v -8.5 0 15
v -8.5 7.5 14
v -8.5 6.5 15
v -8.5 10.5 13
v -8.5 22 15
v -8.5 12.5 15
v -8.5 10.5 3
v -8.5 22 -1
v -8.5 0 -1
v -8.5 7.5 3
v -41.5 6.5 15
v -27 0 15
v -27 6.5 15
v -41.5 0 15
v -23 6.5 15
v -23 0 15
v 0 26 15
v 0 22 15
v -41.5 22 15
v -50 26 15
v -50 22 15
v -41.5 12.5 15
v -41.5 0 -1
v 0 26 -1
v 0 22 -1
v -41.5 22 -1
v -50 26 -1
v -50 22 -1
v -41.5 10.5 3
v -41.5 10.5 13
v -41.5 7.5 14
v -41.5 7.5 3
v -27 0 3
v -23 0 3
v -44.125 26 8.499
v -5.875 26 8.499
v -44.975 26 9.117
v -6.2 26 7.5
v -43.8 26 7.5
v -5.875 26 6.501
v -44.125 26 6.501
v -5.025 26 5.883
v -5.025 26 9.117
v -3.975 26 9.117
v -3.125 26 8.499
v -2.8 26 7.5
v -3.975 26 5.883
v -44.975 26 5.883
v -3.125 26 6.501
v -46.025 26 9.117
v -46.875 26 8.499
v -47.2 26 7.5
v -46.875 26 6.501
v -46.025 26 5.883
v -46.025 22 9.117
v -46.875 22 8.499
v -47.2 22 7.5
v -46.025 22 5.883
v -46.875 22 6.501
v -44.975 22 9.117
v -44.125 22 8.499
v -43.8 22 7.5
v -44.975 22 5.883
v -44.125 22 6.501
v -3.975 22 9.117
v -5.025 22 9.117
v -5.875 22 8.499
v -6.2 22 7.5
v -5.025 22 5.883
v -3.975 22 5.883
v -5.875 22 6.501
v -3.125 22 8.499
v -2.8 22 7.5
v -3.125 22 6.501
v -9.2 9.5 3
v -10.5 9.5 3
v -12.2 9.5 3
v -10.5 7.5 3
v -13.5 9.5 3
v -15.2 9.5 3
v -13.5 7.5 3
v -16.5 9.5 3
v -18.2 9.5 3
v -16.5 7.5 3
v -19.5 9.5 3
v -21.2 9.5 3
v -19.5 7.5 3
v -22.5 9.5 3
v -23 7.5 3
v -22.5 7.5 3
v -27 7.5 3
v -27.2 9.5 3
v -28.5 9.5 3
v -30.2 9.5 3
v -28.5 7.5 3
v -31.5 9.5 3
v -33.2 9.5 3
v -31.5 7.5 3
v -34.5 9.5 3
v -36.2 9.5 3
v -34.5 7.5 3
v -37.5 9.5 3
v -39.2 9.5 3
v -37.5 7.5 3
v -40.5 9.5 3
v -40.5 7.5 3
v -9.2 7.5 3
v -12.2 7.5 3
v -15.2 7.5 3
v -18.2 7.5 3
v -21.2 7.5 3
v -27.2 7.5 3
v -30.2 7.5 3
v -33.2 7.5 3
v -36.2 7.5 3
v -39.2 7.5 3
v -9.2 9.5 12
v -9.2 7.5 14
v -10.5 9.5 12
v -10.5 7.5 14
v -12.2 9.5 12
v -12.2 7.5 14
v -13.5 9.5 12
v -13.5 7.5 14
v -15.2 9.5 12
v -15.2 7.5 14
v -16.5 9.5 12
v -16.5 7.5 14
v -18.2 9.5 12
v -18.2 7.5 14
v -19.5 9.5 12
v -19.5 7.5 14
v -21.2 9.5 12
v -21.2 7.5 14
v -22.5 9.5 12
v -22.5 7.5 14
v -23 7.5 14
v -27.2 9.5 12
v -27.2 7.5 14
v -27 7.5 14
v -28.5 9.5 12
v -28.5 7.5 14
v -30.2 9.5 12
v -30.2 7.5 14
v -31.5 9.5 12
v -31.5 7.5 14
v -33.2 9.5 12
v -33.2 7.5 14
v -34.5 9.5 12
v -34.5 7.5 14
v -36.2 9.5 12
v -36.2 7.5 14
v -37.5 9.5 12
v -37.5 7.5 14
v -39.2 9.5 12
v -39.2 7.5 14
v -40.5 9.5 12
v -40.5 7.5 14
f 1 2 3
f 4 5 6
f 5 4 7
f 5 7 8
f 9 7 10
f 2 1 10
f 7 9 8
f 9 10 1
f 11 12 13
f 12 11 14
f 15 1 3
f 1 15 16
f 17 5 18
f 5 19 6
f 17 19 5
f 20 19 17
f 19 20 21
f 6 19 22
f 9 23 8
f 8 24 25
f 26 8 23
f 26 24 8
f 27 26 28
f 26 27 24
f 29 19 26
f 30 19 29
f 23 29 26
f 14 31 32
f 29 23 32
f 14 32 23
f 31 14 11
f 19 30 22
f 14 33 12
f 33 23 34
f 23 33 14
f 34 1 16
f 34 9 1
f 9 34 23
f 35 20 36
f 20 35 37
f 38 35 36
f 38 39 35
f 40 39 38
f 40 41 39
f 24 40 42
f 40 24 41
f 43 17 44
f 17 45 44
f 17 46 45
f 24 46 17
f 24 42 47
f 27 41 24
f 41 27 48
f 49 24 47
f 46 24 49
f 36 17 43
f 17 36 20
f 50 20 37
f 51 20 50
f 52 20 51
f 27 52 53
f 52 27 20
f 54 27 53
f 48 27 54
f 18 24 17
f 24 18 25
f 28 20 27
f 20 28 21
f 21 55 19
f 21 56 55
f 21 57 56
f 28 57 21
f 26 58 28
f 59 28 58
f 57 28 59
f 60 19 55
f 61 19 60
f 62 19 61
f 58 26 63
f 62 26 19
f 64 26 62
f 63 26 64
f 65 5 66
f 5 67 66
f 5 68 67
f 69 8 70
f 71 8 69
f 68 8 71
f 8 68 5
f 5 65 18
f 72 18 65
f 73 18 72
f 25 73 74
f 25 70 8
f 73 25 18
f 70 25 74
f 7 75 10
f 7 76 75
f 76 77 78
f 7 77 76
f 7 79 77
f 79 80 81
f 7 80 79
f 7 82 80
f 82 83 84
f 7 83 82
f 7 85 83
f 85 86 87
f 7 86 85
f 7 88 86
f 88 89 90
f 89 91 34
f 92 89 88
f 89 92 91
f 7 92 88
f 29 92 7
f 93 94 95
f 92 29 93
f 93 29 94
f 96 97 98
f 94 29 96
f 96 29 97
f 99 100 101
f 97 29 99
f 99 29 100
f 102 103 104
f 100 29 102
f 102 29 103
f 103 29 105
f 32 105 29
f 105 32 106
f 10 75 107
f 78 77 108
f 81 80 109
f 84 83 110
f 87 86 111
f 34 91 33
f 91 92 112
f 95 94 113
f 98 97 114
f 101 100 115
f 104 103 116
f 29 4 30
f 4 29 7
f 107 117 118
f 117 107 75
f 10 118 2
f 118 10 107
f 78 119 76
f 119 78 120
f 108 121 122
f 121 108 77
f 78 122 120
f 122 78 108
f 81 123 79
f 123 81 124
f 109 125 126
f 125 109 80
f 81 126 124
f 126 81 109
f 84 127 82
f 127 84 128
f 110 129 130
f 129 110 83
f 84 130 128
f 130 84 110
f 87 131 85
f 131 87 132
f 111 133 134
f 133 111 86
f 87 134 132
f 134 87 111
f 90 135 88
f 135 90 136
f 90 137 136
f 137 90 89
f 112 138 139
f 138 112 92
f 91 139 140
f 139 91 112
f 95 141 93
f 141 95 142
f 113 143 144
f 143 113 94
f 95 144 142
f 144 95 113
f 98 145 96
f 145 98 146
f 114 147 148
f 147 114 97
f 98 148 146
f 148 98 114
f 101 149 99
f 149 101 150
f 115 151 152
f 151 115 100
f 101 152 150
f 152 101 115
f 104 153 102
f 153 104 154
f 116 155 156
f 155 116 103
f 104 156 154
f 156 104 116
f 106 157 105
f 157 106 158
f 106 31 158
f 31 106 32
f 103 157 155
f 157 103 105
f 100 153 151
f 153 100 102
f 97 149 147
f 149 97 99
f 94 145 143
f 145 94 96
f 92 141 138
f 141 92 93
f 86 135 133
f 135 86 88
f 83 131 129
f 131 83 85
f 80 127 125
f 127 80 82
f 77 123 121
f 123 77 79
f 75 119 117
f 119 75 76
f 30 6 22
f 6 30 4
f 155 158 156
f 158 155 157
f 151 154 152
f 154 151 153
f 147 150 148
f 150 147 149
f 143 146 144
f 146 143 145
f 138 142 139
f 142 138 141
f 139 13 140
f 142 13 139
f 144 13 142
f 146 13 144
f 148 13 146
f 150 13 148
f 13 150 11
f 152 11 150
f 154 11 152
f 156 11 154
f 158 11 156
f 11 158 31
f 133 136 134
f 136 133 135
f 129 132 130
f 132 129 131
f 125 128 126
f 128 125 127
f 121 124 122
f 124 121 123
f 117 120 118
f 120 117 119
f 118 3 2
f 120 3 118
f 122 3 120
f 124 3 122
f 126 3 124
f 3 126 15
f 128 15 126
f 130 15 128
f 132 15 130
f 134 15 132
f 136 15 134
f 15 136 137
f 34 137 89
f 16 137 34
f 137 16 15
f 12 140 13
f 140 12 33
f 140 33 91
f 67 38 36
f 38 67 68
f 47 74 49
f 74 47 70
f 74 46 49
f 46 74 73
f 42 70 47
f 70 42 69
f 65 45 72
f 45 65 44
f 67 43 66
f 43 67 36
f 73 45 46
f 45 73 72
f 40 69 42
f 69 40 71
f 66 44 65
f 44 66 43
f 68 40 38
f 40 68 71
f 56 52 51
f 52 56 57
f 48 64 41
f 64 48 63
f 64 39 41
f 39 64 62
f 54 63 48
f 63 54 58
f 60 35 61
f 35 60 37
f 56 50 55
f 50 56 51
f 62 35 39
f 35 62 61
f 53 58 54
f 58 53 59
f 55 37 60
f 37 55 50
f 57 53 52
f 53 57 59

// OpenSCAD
// file: ../inc/functions.scad
// PRUSA iteration3
// Functions used in many files
// GNU GPL v3
// Josef Průša <josefprusa@me.com>
// Václav 'ax' Hůla <axtheb@gmail.com>
// Vlnofka <>
// http://www.reprap.org/wiki/Prusa_Mendel
// http://github.com/prusajr/PrusaMendel


module nut(d,h,horizontal=true){
    cornerdiameter =  (d / 2) / cos (180 / 6);
    cylinder(h = h, r = cornerdiameter, $fn = 6);
    if(horizontal){
        for(i = [1:6]){
            rotate([0,0,60*i]) translate([-cornerdiameter-0.2,0,0]) rotate([0,0,-45]) cube([2,2,h]);
        }
    }
}

module fillet(radius, height=100, $fn=0) {
    //this creates acutal fillet
    translate([-radius, -radius, -height / 2 - 0.02]) difference() {
        cube([radius * 2, radius * 2, height + 0.04]);
        if ($fn == 0 && (radius == 2 || radius == 3 || radius == 4)) {
            cylinder(r=radius, h=height + 0.04, $fn=4 * radius);
        } else {
            cylinder(r=radius, h=height + 0.04, $fn=$fn);
        }

    }
}

module cube_fillet(size, radius=-1, vertical=[3,3,3,3], top=[0,0,0,0], bottom=[0,0,0,0], center=false, $fn=0){
    //
    if (use_fillets == 1) {
        if (center) {
            cube_fillet_inside(size, radius, vertical, top, bottom, $fn);
        } else {
            translate([size[0]/2, size[1]/2, size[2]/2])
                cube_fillet_inside(size, radius, vertical, top, bottom, $fn);
        }
    } else {
        if (use_fillets == 2) {
            if (center) {
                cube_fillet_inside(size, radius, vertical, top, bottom, 4);
            } else {
                translate([size[0]/2, size[1]/2, size[2]/2])
                    cube_fillet_inside(size, radius, vertical, top, bottom, 4);
            }

        } else {
            cube(size, center);
        }
    }

}

module cube_negative_fillet(size, radius=-1, vertical=[3,3,3,3], top=[0,0,0,0], bottom=[0,0,0,0], $fn=0){

    j=[1,0,1,0];

    for (i=[0:3]) {
        if (radius > -1) {
            rotate([0, 0, 90*i]) translate([size[1-j[i]]/2, size[j[i]]/2, 0]) fillet(radius, size[2], $fn=$fn);
        } else {
            rotate([0, 0, 90*i]) translate([size[1-j[i]]/2, size[j[i]]/2, 0]) fillet(vertical[i], size[2], $fn=$fn);
        }
        rotate([90*i, -90, 0]) translate([size[2]/2, size[j[i]]/2, 0 ]) fillet(top[i], size[1-j[i]], $fn=$fn);
        rotate([90*(4-i), 90, 0]) translate([size[2]/2, size[j[i]]/2, 0]) fillet(bottom[i], size[1-j[i]], $fn=$fn);

    }
}

module cube_fillet_inside(size, radius=-1, vertical=[3,3,3,3], top=[0,0,0,0], bottom=[0,0,0,0], $fn=0){
    //makes CENTERED cube with round corners
    // if you give it radius, it will fillet vertical corners.
    //othervise use vertical, top, bottom arrays
    //when viewed from top, it starts in upper right corner (+x,+y quadrant) , goes counterclockwise
    //top/bottom fillet starts in direction of Y axis and goes CCW too


    if (radius == 0) {
        cube(size, center=true);
    } else {
        difference() {
            cube(size, center=true);
            cube_negative_fillet(size, radius, vertical, top, bottom, $fn);
        }
    }
}


module nema17(places=[1,1,1,1], size=15.5, h=10, holes=false, shadow=false, $fn=24){
    for (i=[0:3]) {
        if (places[i] == 1) {
            rotate([0, 0, 90*i]) translate([size, size, 0]) {
                if (holes) {
                    rotate([0, 0, -90*i])  translate([0,0,-10]) screw(r=1.7, slant=false, head_drop=13, $fn=$fn, h=h+12);
                } else {
                    rotate([0, 0, -90*i]) cylinder(h=h, r=5.5, $fn=$fn);
                }
            }
        }
    }
    if (shadow != false) {
        %translate ([0, 0, shadow+21+3]) cube([42,42,42], center = true);
    //flange
        %translate ([0, 0, shadow+21+3-21-1]) cylinder(r=11,h=2, center = true, $fn=20);
    //shaft
        %translate ([0, 0, shadow+21+3-21-7]) cylinder(r=2.5,h=14, center = true);
    }
}

module screw(h=20, r=2, r_head=3.5, head_drop=0, slant=i_am_box, poly=false, $fn=0){
    //makes screw with head
    //for substraction as screw hole
    if (poly) {
        cylinder_poly(h=h, r=r, $fn=$fn);
    } else {
        cylinder(h=h, r=r, $fn=$fn);
    }
    if (slant) {
        translate([0, 0, head_drop-0.01]) cylinder(h=r_head, r2=0, r1=r_head, $fn=$fn);
    }

    if (head_drop > 0) {
        translate([0, 0, -0.01]) cylinder(h=head_drop+0.01, r=r_head, $fn=$fn);
    }
}

module plate_screw(long=0) {
    if (i_am_box == 0) {
        translate([0, 0, -long]) screw(head_drop=14 + long, h=30 + long, r_head=3.6, r=1.7, $fn=24, slant=false);
    } else {
        translate([0, 0, -2 - long]) screw(head_drop=14 + long, h=30 + long, r_head=4.5, r=2, $fn=24, slant=true);
    }
}

//radius of the idler assembly (to surface that touches belt, ignoring guide walls)
function idler_assy_r_inner(idler_bearing) = (idler_bearing[0] / 2) + (6 * single_wall_width + 0.2) * idler_bearing[3];
//outer radius of the idler assembly (to smooth side of belt) 
function idler_assy_r_outer(idler_bearing) = idler_assy_r_inner(idler_bearing) + belt_thickness + 1;


module idler_assy(idler_bearing = [22, 7, 8, 1]) {

    //bearing axle
    translate([0,0,-1]) cylinder(h = 120, r=(idler_bearing[2] + 1) / 2, $fn=small_hole_segments, center=true);
    //bearing shadow
    %cylinder(h = idler_bearing[1], r=idler_bearing[0]/2, center=true);
    //belt shadow
    %cylinder(h = belt_width, r=idler_assy_r_outer(idler_bearing), center=true);

    cylinder(h = idler_width + 1, r=idler_assy_r_outer(idler_bearing) + 0.5, center=true);
}

module belt(len, side = 0){
    //belt. To be substracted from model
    //len is in +Z, smooth side in +X, Y centered
    translate([-0.5, 0, 0]) maketeeth(len);
    translate([0, -4.5, -0.01]) cube([belt_thickness, 9, len + 0.02]);
    if (side != 0) {
    translate([0, -4.5 + side, -0.01]) cube_fillet([belt_thickness, 9, len + 0.02], vertical = [3, 0, 0, 0]);
    }
}


module maketeeth(len){
    //Belt teeth. 
    for (i = [0 : len / belt_tooth_distance]) {
        translate([0, 0, i * belt_tooth_distance]) cube([2, 9, belt_tooth_distance * belt_tooth_ratio], center = true);
    }
}
// file: ../inc/conf_bushing.scad
// PRUSA iteration3
// Bushing and bering dimensions
// GNU GPL v3
// Václav 'ax' Hůla <axtheb@gmail.com>
// http://www.reprap.org/wiki/Prusa_Mendel
// http://github.com/prusajr/PrusaMendel
//

// each config is in form[r_rod, r, h, type, name] where:
//     r_rod  is smooth rod radius [0]
//     r is outer bushing radius needed for tight fit or bearing radius with loose fit [1]
//     h is barrel length [2]
//     type is 0 for linear bearings, 1 is for bushings which needs to be enclosed fully. [3]
//       type 1 may have flange, but type 0 not
//     name is human readable name [4]

//bushings
conf_b_bushing8 = [4, 5.1, 10, 1, "Tube shaped bushing like igus J(V)FM 0810-10"];
conf_b_bushing10 = [5, 6.1, 10, 1, "Tube shaped bushing with id=10mm, od=12mm and length of at least 10mm, like J(V)FM 1012-10"];
conf_b_bushing12 = [6, 7.1, 15, 1, "Tube shaped bushing with id=12mm, od=14mm and length of at least 15mm, like SF-1 1215"];

conf_b_bronze8 = [4, 8, 11, 1, "bronze self-aligning bushing, 8mm"];

//shorter beaings (two on each Z axis)
conf_b_lm8uu = [4, 7.7, 24, 0, "lm8uu bearing (standard)"];
conf_b_lm10uu = [5, 9.7, 29, 0, "lm10uu bearing (10mm smooth rod)"];
conf_b_lme8uu =[4, 8.2, 25, 0, "lme8uu bearing"];
conf_b_lm12uu = [6, 10.6, 30, 0, "lm12uu bearing (12mm smooth rod)"];

//longer bearings
conf_b_lm8luu = [4, 7.7, 45, 0, "lm8luu bearing (double length)"];
conf_b_lm10luu = [5, 9.7, 55, 0, "lm10luu bearing (10mm smooth rod, long)"];
conf_b_lm12luu = [6, 10.6, 57, 0, "lm12luu bearing (12mm, double length)"];


// Select idler bearing size **************************************************
// [outer_diameter, width, inner_diameter, uses_guide]

// roughly sorted by desirability

// one bearing with guides
// Select by availability, smaller is better.
bearing_623 = [10, 4, 3, 1, "623 bearing"];
bearing_624 = [13, 5, 4, 1, "624 bearing"];
bearing_625 = [16, 5, 5, 1, "625 bearing"];

// two bearings side by side - for use without bearing guides.
// Not recomended anymore
bearing_625_double = [16, 10, 5, 0, "625 bearing x2"];
bearing_624_double = [13, 10, 4, 0, "624 bearing x2"];
bearing_623_double = [10, 8, 3, 0, "623 bearing"];

// 608 [standard skate bearings] with bearing guide
bearing_608 = [22, 7, 8, 1, "608 bearing"];
// 608 bearings with fender washers.
// the belt brushes both against the carriage and the washers.
bearing_608_washers = [22, 10, 8, 0, "608 bearing"];
// file: ../inc/metric.scad
// PRUSA iteration3
// Default metric sizes
// GNU GPL v3
// Josef Průša <josefprusa@me.com>
// http://www.reprap.org/wiki/Prusa_Mendel
// http://github.com/prusajr/PrusaMendel

// DONT CHANGE THIS FILE! ALTER VALUES IN CONFIGURATION.SCAD INSTEAD

// RODS

threaded_rod_diameter = 8.7;
threaded_rod_diameter_horizontal = 8.7;
smooth_bar_diameter = 8;
smooth_bar_diameter_horizontal = 8.5;

// Nuts and bolts

m8_diameter = 9;
m8_nut_diameter = 14.1;

m4_diameter = 4.5;
m4_nut_diameter = 9;
m4_nut_diameter_horizontal = 10;

m3_diameter = 3.6;
m3_nut_diameter = 5.3;
m3_nut_diameter_horizontal = 6.8;
m3_washer_diameter = 6.9;

// Motors

motor_shaft = 5.5;
// file: ../configuration.scad
// PRUSA iteration3
// Configuration file
// GNU GPL v3
// Josef Průša <josefprusa@me.com>
// Václav 'ax' Hůla <axtheb@gmail.com>
// http://www.reprap.org/wiki/Prusa_Mendel
// http://github.com/prusajr/PrusaMendel

include <inc/metric.scad>;
include <inc/conf_bushing.scad>;

// Custom settings here, tailor to your supplies and print settings


// Extruder settings **********************************************************
// Don't forget to set your slicer's extruder settings to match the values you
// enter here.

layer_height = 0.3;
// Width over thickness determines how wide the plastic will be when extruded
// onto the object that is being printed. width_over_thickness is multiplied
// by the layer_height to calculate this width. i.e. If your layer_height is
// set to 0.3 mm and your width_over_thickness is set to 2.2, the resulting
// width will be 0.66 mm.
width_over_thickness = 2.2;

// Select your belt type ******************************************************

//T2.5
//belt_tooth_distance = 2.5;
//belt_tooth_ratio = 0.75;

//T5 (strongly discouraged)
//belt_tooth_distance = 5;
//belt_tooth_ratio = 0.75;

//HTD3
belt_tooth_distance = 3;
belt_tooth_ratio = 0.75;

//MXL
//belt_tooth_distance = 2.032;
//belt_tooth_ratio = 0.64;

//GT2 there is bunch of GT2 belts with different tooth-to-tooth distance
//adjust to your needs
//belt_tooth_distance = 2;
//belt_tooth_ratio = 0.5;

// For T type belts you will probably want 0.8mm or so.
belt_thickness = 1.75;

// Choose bearing/bushing configuration ***************************************
// conf_b_* are in inc/conf_bushing.scad

bushing_xy = conf_b_lm12luu;
bushing_z = conf_b_lm12luu;
// for longer bearings use one shorter in x-carriage to make place for belt attachment
// by default use same as xy
bushing_carriage = conf_b_lm12uu;

// Select idler bearing size **************************************************
// [outer_diameter, width, inner_diameter, uses_guide]
// 608 [standard skate bearings] with bearing guide
bearing_608 = [22, 7, 8, 1];
// 608 bearings with fender washers. Not good at all, the belt brushes against the carriage
bearing_608_washers = [22, 10, 8, 0];
// one 625 with guides
bearing_625 = [16, 5, 5, 1];
// two 625 - for use without bearing guides.
bearing_625_double = [16, 10, 5, 0];

// those two here are really good:
bearing_624_double = [13, 10, 4, 0];
// this one has roughly same diameter as pulley, makes belt parallel so its prettier
bearing_623_double = [10, 8, 3, 0];

idler_bearing = bearing_624_double;

// Select carriage lenght ******************************************************
// 30 for single carriage extruder (two holes with centers 30mm apart)
// 50 for wade or single with fan (three holes, 30-20)
// 80 for full length carriage (four holes, 30-20-30)

carriage_l_base = 80;

// Fillets ********************************************************************
// fillets are rounded corners of boxes. The right engineering term is probably radius
// but cad software calls it fillet.
// mostly cosmetic, except z axis.
// 0 = no fillets
// 1 = fillet
// 2 = chamfer (cut the edges at 45deg. angle)
// Please do put only parts with fillets on sale, other options are not really tested

use_fillets = 1;

// set to 0 for single plate (affects z axis and screws that attach RP parts to frame)
i_am_box = 1;

// if you do your own plate and can move bottom Z screws 5mm up set this to 0 to
// get stronger motor mount. Only for i_am_box = 0
i_want_to_use_single_plate_dxf_and_make_my_z_weaker = 1;


// Radius of long threaded rod on Y frame

// Affects y-axis-corner (both box and single plate)
// and y-axis-bracket (box only)

//Use 5.4 for M10 or 4.4 for M8
y_threaded_rod_long_r = 5.4;


// Thickness of the boards that make the box frame.

// in y-axis-corner it governs the height of the corners by adjusting the
// distance between ground and M10 threaded rod. (both box and single plate)

// For box model, the parts that hold Z smooth rod have one hole from front
// and one from side, and this setting makes sure that the screw from side
// is in the center of the plank.

// Use 12 for single plate
// or 20 if you want to use the Y lm8uu holders 
// (extras/bearing-holder-single-plate-y)
board_thickness = 18;

// Segments of small holes. some poeple claim that a low value makes them easier to print.
small_hole_segments=7;


// END of custom settings *****************************************************


// You are not supposed to change this
board_to_xz_distance = 26;
xaxis_rod_distance = 45;

//calculated from settings
single_wall_width = width_over_thickness * layer_height;

idler_width = (idler_bearing[1] > 7 ? idler_bearing[1] : 7) + 2.5 * idler_bearing[3] ;

//deltas are used to enlarge parts for bigger bearings 
xy_delta = ((bushing_xy[1] <= 7.7) ? 0 : bushing_xy[1] - 7.7) * 0.9;
z_delta = (bushing_z[1] <= 7.7) ? 0 : bushing_z[1] - 7.7;

// CHANGE ONLY THE STUFF YOU KNOW
// IT WILL REPLACE DEFAULT SETTING

// RODS

// threaded_rod_diameter = 0;
// threaded_rod_diameter_horizontal = 0;
// smooth_bar_diameter = 0;
// smooth_bar_diameter_horizontal = 0;

// Nuts and bolts

// m8_diameter = 0;
// m8_nut_diameter = 0;

// m4_diameter = 0;
// m4_nut_diameter = 0;

// m3_diameter = 0;
// m3_nut_diameter = 0;

// Bushing holder

// bushing_core_diameter = smooth_bar_diameter;
// bushing_material_thickness = 0;

///counted stuff
m3_nut_diameter_bigger = ((m3_nut_diameter  / 2) / cos (180 / 6))*2;

// functions
include <inc/functions.scad>

// These constants define the geometry of the complete-printer.scad

//x_smooth_rod_length=325;
//y_smooth_rod_length=405;
//z_smooth_rod_length=235;
bed_x_size=225;
bed_y_size=225;

x_smooth_rod_length=460+board_thickness*2; // 492 for 16mm thickness; 484 for 12mm thickness
y_smooth_rod_length=470;
z_smooth_rod_length=405;
// main file
// PRUSA iteration3
// Y belt holder
// GNU GPL v3
// Josef Průša <iam@josefprusa.cz> and contributors
// http://www.reprap.org/wiki/Prusa_Mendel
// http://prusamendel.org

include <../configuration.scad>

module belt_holder_base(){
 translate([-33-8.5,0,-1]) cube([33,15,16]); 
 translate([-33-8.5,11,-1]) cube([33,15,16]);
 translate([-50,22,-1]) cube([50,4,16]);	
}

module belt_holder_beltcut(){
 position_tweak=-0.2;
 // Belt slit
 translate([-66,-0.5+10,belt_tooth_distance]) cube([67,1,15]);
 // Smooth insert cutout
 translate([-66,-0.5+10,12]) rotate([45,0,0]) cube([67,15,15]);
 // Individual teeth
 for ( i = [0 : 23] ){
  translate([0-i*belt_tooth_distance+position_tweak,-0.5+8,3]) cube([1.7,3,15]);
 }
 // Middle opening
 translate([-2-25,-1,3]) cube([4,11,15]);	
}

module belt_holder_holes(){
 translate([-4.5,0,7.5]) rotate([-90,0,0]) cylinder(h=30, r=1.7, $fn=10);
 translate([-45.5,0,7.5]) rotate([-90,0,0]) cylinder(h=30, r=1.7, $fn=10);
}

// Final part
module belt_holder(){
 difference(){
  belt_holder_base();
  belt_holder_beltcut();
  belt_holder_holes();
 }
}

belt_holder();
